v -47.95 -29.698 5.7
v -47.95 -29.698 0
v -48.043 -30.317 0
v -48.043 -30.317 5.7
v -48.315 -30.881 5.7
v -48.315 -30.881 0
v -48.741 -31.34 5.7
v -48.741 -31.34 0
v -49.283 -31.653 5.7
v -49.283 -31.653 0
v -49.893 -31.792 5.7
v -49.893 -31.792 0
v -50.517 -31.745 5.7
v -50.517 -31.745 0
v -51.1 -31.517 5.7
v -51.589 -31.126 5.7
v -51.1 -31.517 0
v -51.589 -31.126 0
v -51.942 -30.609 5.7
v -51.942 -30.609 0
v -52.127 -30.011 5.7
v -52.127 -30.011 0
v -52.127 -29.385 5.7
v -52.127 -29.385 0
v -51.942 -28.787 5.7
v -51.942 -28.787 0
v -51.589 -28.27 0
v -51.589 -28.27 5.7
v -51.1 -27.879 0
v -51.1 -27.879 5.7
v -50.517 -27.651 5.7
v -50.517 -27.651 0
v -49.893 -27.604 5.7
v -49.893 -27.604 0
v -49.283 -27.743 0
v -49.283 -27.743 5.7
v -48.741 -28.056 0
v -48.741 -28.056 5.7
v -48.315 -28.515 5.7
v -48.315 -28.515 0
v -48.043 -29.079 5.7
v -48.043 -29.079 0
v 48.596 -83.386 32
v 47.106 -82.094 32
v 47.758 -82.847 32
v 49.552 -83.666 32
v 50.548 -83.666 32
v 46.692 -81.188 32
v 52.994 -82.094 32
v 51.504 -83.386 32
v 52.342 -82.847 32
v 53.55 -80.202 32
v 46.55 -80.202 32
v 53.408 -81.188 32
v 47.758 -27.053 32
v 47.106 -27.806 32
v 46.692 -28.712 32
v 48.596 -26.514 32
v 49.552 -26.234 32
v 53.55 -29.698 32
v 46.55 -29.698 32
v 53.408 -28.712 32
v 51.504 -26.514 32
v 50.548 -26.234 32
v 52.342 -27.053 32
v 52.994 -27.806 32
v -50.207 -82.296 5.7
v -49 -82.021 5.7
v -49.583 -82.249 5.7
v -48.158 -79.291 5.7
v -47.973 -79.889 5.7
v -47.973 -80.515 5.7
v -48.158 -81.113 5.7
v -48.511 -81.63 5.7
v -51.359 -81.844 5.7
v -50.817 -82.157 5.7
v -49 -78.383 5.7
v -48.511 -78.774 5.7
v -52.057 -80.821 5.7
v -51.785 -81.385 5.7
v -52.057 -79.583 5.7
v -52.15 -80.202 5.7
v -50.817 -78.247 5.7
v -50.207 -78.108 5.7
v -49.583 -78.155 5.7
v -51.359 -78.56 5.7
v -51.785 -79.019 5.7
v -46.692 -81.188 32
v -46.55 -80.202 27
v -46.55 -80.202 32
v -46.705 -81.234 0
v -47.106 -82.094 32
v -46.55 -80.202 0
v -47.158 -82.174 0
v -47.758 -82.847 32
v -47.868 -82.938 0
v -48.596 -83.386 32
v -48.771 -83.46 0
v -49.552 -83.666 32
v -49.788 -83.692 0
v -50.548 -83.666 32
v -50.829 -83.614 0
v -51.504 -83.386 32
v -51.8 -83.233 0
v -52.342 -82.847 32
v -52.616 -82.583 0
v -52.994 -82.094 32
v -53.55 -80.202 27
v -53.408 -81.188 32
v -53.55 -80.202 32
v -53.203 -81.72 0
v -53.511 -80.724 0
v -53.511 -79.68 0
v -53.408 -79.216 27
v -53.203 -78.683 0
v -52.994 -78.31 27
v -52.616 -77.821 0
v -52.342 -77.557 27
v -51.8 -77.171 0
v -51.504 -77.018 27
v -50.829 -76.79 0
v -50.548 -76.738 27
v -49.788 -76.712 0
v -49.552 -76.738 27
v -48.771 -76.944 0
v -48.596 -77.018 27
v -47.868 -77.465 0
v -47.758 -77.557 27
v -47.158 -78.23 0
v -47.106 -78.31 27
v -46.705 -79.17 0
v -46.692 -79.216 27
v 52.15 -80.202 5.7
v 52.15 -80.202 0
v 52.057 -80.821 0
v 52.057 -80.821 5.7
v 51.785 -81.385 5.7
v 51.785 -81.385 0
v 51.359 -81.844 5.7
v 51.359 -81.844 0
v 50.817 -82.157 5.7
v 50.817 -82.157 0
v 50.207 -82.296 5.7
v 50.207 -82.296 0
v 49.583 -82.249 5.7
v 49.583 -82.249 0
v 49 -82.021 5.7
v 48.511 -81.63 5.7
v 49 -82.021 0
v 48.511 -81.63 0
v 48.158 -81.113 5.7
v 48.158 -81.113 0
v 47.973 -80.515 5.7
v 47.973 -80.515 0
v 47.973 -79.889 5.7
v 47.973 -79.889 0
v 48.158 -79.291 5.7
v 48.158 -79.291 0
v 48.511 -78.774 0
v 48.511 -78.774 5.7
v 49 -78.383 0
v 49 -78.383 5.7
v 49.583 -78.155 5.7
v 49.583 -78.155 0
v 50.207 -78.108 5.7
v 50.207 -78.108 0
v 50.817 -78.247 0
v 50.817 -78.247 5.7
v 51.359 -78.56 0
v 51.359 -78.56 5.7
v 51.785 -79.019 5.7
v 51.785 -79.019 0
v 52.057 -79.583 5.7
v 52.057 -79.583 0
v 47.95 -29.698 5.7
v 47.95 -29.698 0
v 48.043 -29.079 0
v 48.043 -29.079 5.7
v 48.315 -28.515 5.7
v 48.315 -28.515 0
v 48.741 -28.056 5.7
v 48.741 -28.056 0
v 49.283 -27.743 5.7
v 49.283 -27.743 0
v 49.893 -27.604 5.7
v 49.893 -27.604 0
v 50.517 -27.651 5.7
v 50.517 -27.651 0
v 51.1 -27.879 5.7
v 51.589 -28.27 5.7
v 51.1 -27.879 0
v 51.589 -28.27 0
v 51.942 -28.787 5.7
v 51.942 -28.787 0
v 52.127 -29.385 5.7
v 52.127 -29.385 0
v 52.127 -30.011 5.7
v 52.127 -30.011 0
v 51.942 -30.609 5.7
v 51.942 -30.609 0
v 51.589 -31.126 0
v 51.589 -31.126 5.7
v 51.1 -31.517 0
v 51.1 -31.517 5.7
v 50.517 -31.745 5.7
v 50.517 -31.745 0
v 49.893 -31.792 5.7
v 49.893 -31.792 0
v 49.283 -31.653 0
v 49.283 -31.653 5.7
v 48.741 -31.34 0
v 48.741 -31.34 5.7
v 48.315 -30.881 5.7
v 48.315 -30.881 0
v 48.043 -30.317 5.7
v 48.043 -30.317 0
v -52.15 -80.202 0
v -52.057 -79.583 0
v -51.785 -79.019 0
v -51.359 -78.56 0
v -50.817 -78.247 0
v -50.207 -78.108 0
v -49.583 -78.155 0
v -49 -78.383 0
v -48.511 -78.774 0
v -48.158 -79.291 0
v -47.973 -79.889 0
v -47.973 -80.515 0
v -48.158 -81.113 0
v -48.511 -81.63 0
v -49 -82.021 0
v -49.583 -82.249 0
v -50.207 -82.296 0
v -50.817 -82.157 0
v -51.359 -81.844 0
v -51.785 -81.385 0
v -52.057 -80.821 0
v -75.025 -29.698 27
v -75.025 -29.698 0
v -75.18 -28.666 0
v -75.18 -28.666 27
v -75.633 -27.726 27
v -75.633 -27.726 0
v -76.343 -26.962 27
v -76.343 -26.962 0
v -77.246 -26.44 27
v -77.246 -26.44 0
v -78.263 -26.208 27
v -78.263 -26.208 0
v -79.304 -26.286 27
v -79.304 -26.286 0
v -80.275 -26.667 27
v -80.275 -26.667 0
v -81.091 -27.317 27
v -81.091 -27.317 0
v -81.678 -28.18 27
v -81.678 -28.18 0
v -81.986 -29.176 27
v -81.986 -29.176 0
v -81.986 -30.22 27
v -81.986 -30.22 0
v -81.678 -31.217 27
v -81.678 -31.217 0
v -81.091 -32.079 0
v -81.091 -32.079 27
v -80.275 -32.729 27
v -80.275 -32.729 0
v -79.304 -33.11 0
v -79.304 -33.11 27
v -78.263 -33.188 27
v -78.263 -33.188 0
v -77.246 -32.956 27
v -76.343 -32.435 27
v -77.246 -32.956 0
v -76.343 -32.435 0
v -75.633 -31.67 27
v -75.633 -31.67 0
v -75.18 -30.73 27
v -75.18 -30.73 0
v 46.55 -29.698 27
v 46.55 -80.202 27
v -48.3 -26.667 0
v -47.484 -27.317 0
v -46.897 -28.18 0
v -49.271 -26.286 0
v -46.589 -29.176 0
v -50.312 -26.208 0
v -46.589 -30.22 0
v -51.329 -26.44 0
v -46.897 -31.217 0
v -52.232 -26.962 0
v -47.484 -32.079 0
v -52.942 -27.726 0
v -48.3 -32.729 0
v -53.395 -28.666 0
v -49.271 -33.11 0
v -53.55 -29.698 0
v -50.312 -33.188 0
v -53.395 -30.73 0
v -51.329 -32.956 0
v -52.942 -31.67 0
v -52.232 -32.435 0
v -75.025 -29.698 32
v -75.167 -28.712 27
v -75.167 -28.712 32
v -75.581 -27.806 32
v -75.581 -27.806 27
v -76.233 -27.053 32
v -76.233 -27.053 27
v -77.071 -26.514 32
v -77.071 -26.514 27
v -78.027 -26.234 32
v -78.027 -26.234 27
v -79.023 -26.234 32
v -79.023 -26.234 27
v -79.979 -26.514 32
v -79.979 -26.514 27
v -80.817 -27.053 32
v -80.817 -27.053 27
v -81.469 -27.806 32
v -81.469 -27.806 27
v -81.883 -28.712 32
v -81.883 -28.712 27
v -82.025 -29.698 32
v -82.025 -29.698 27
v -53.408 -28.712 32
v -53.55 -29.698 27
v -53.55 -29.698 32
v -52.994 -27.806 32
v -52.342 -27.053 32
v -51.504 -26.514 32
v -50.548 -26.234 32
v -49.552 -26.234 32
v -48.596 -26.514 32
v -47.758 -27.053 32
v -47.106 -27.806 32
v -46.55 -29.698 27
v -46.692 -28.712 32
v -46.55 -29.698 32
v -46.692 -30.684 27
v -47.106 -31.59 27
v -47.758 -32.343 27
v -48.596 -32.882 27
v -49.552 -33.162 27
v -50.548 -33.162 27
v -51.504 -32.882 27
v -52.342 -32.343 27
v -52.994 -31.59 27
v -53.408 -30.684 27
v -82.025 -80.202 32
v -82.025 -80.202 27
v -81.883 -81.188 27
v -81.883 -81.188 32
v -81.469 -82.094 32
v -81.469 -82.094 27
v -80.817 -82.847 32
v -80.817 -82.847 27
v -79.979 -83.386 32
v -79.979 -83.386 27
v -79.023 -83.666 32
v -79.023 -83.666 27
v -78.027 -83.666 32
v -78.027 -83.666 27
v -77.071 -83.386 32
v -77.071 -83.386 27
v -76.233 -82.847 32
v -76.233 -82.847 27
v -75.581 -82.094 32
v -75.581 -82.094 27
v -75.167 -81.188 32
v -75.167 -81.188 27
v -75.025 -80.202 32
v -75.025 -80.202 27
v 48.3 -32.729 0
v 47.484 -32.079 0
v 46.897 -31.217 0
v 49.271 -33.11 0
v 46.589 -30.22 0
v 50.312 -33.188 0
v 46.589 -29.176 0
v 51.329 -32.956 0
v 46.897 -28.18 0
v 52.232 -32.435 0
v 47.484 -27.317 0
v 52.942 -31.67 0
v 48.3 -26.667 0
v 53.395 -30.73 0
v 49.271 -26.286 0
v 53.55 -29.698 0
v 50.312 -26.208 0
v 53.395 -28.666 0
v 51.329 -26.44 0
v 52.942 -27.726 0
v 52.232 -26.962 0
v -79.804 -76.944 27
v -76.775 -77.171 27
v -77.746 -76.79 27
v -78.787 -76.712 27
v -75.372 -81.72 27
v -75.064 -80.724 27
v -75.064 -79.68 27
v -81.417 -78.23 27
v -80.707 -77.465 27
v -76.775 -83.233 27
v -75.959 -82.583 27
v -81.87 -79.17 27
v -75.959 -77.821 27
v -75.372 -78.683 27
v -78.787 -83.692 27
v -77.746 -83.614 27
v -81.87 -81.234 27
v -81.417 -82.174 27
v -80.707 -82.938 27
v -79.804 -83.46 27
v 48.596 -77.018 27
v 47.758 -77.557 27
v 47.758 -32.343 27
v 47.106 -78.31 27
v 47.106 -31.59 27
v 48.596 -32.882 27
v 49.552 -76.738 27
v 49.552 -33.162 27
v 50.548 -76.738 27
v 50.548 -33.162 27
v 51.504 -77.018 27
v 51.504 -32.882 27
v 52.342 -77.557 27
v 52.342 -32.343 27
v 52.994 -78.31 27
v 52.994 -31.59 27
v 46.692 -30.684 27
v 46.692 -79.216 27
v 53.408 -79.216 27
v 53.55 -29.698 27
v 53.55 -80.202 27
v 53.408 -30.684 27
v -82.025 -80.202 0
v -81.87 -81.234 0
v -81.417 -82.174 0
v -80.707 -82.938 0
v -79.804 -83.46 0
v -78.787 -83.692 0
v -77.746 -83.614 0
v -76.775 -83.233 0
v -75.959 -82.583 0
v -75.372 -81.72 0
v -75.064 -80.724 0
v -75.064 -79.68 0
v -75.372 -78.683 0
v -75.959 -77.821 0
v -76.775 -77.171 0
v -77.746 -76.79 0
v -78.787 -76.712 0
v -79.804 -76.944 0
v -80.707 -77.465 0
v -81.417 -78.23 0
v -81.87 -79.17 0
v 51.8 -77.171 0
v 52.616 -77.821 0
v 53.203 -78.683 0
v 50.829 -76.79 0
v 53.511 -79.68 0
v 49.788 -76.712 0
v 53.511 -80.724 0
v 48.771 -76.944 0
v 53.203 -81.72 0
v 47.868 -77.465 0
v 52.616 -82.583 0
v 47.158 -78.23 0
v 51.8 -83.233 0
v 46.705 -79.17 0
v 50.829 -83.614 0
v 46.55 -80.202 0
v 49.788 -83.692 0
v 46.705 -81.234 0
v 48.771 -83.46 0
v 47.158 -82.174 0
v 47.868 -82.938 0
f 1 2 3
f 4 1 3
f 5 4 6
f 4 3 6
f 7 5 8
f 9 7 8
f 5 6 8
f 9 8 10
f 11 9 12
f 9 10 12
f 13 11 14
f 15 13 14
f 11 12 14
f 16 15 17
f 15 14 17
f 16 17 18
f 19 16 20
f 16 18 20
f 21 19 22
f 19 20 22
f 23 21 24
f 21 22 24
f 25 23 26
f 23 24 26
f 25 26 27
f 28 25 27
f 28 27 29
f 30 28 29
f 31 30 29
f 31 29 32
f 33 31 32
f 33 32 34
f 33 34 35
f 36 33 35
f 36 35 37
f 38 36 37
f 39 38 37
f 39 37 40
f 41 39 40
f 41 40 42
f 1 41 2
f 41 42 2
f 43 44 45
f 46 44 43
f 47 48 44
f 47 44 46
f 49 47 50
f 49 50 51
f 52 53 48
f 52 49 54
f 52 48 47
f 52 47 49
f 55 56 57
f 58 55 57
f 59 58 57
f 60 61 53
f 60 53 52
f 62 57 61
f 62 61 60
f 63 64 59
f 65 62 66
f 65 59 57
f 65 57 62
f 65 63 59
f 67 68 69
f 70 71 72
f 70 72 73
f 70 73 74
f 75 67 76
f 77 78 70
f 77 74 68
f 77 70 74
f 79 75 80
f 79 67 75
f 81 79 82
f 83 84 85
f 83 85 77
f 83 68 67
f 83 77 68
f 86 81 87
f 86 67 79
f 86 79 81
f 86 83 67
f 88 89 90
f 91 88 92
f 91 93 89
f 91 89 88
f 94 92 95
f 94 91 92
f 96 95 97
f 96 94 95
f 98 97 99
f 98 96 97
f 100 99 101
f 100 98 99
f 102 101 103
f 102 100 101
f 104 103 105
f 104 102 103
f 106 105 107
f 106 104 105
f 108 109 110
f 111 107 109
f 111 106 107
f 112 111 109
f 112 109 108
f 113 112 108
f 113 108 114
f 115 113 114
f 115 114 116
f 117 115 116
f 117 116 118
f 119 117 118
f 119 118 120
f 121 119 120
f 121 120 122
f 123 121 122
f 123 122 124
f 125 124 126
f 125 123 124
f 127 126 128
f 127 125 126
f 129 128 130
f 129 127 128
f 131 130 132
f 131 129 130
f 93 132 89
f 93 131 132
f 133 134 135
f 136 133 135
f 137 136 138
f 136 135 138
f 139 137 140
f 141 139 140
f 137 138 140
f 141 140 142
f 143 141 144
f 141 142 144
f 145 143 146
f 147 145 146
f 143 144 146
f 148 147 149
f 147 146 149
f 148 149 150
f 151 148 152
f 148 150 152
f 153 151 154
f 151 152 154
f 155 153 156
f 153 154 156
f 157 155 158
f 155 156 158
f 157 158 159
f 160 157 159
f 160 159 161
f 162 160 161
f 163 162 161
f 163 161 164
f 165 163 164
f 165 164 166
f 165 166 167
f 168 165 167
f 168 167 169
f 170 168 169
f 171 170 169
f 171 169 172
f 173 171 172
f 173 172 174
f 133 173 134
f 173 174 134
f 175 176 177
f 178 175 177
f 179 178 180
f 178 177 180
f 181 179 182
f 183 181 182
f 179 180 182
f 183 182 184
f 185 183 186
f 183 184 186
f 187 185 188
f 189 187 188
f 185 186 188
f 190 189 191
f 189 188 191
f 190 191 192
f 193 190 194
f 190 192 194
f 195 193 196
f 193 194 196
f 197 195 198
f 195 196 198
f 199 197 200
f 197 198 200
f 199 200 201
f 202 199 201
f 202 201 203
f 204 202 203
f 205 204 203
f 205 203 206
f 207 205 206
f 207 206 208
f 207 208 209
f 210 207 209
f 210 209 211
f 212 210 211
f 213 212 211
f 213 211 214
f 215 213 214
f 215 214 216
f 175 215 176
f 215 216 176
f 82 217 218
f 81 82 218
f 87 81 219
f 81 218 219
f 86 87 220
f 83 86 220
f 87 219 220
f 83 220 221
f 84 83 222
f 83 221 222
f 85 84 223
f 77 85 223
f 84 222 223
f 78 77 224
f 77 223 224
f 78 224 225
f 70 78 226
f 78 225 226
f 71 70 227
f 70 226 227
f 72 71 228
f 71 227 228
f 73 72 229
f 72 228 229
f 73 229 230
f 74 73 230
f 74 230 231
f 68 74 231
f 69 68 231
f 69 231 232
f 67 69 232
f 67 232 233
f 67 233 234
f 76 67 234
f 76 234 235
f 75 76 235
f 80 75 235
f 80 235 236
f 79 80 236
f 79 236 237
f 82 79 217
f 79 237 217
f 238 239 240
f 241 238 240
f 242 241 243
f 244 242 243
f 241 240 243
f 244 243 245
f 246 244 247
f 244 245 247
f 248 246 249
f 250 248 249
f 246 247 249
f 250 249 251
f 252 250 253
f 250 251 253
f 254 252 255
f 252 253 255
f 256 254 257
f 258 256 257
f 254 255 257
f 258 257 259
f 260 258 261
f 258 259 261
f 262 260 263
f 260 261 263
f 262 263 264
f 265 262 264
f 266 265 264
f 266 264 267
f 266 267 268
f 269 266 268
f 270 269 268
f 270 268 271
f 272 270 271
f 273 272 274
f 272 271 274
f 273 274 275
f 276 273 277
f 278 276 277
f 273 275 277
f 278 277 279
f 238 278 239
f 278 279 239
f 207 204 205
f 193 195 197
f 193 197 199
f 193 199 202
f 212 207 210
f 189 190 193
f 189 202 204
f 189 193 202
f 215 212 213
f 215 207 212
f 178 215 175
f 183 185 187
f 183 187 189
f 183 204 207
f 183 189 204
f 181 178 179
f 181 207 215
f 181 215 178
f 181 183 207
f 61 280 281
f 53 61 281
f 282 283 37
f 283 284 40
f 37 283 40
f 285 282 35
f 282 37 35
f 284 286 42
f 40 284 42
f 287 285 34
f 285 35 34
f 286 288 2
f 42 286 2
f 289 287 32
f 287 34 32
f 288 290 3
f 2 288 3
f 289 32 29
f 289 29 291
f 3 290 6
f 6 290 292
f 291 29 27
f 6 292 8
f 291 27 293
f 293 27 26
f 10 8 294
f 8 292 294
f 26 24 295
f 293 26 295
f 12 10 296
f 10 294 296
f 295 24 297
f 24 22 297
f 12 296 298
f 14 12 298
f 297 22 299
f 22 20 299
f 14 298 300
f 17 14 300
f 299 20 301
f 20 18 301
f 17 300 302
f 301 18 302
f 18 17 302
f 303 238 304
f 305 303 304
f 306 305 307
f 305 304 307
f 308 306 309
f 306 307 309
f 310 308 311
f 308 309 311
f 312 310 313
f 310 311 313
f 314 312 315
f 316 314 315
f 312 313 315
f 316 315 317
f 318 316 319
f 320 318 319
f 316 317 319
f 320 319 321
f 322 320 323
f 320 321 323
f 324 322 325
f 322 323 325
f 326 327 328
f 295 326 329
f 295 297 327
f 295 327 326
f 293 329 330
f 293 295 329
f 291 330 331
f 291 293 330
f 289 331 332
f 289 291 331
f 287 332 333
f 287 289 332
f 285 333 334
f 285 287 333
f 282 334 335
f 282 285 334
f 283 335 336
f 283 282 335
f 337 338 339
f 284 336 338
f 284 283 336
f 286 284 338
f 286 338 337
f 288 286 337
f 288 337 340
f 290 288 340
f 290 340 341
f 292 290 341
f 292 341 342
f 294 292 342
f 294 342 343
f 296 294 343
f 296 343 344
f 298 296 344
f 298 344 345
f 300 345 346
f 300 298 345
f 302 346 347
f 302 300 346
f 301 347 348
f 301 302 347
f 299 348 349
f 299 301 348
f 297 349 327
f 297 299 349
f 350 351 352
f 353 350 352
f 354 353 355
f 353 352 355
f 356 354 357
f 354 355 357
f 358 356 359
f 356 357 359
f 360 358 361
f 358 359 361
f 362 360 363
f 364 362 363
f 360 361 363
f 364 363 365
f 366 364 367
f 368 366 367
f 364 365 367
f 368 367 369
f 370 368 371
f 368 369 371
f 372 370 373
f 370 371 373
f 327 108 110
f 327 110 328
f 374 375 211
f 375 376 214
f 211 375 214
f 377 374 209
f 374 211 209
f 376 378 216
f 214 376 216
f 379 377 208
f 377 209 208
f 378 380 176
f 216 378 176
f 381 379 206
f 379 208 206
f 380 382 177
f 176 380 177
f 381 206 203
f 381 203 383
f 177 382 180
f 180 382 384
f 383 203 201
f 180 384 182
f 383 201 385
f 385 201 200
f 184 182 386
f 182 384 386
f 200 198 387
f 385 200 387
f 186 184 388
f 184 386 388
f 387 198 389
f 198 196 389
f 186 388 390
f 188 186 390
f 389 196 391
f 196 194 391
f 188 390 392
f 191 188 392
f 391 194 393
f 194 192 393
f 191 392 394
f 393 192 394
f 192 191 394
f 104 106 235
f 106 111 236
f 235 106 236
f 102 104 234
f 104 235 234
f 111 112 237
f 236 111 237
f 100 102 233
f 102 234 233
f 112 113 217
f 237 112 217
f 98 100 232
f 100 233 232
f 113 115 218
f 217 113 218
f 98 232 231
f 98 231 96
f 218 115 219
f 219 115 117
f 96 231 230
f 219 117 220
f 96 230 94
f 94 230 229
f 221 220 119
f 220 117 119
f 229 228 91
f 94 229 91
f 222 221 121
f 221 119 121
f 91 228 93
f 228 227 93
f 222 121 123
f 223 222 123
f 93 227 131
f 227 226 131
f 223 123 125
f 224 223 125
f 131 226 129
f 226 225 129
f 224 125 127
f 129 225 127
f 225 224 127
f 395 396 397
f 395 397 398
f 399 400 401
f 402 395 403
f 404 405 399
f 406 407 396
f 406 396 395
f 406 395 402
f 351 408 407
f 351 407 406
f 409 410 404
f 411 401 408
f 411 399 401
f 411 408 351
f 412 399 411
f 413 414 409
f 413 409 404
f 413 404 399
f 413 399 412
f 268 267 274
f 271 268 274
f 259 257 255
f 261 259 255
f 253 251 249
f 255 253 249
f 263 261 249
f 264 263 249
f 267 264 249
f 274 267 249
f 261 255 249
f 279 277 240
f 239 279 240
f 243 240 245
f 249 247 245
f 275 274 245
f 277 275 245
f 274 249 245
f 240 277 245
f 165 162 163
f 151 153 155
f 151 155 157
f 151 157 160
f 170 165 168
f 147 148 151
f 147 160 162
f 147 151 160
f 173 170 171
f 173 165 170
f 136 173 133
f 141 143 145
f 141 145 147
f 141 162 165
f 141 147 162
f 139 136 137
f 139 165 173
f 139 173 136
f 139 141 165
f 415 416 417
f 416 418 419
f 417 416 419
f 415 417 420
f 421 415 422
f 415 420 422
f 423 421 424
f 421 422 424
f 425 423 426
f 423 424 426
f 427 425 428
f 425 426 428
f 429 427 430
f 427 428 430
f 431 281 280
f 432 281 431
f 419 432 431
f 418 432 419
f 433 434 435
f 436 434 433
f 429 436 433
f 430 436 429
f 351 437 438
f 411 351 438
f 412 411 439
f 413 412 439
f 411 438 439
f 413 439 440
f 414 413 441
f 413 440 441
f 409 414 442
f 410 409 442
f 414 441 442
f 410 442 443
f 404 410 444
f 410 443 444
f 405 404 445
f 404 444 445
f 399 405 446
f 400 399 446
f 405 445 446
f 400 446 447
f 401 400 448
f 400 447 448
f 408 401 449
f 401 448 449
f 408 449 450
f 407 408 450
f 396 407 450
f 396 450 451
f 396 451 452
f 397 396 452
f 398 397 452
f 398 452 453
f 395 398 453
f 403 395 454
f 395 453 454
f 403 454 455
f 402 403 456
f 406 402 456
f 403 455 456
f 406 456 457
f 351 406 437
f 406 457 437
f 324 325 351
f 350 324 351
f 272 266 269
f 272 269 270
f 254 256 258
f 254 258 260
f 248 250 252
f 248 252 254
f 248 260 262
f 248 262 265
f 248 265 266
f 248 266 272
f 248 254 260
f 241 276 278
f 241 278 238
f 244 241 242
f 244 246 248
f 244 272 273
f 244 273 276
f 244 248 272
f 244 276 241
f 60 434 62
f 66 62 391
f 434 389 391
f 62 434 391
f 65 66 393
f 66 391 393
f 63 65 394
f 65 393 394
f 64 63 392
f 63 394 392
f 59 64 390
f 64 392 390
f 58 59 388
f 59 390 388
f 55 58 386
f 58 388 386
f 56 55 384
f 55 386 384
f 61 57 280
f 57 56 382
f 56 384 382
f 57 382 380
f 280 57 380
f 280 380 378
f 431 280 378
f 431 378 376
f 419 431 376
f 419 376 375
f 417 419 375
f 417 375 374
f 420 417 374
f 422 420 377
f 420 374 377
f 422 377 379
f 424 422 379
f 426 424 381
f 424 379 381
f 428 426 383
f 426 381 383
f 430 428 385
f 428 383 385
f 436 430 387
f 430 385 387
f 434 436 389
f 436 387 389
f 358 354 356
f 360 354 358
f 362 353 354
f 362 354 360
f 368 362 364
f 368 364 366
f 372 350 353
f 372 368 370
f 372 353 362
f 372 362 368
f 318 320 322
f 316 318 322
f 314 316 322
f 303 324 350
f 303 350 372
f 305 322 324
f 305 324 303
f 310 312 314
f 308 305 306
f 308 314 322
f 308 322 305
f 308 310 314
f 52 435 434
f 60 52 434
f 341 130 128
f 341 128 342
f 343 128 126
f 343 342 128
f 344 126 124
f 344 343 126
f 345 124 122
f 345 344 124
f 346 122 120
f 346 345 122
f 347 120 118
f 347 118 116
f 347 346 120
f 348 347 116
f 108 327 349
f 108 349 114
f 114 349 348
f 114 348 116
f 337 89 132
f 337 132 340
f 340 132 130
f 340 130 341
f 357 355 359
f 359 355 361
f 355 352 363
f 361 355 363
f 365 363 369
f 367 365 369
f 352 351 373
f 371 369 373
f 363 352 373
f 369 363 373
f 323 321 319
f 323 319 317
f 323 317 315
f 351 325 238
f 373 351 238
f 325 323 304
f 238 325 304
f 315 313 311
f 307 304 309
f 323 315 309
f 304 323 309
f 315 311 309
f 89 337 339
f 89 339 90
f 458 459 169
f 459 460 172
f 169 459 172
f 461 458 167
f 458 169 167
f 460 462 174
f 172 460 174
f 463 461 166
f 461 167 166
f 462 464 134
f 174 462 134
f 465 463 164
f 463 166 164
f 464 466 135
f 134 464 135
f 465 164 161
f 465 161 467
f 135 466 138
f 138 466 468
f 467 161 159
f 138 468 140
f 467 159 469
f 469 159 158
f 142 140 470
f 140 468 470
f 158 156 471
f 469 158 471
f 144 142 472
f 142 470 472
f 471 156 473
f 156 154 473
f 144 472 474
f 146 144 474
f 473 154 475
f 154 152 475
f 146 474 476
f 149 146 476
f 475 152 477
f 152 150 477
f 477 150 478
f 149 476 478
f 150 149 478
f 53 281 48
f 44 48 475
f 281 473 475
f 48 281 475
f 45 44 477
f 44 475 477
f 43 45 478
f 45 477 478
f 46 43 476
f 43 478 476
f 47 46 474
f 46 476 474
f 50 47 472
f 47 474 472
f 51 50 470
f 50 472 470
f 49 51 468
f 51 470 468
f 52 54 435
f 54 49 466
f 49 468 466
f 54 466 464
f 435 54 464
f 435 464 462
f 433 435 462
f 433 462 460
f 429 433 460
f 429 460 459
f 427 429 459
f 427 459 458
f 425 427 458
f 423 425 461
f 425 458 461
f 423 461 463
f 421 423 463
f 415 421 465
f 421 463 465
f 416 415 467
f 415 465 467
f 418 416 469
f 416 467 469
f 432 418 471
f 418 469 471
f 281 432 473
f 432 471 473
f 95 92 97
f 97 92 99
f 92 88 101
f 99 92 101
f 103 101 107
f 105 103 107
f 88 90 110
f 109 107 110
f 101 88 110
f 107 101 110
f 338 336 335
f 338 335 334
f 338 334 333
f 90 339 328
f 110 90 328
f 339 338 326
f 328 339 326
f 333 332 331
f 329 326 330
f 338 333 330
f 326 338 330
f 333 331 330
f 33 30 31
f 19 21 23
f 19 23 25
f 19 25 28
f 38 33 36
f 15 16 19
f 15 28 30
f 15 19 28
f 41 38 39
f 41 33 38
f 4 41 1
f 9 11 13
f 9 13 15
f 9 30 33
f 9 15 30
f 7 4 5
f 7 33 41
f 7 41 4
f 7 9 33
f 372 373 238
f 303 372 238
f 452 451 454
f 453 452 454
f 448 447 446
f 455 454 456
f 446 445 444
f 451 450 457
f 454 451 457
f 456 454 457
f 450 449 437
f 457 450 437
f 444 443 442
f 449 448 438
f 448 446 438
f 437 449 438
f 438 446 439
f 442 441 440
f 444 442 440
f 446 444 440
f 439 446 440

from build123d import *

# Parameters (mm, degrees)
SKIZZE1_R                         = 3.5
AUFSATZ_LINEAR_AUSTRAGEN1_DEPTH   = 27
AUFSATZ_LINEAR_AUSTRAGEN1_2_DEPTH = 27
AUFSATZ_LINEAR_AUSTRAGEN1_3_DEPTH = 27
AUFSATZ_LINEAR_AUSTRAGEN1_4_DEPTH = 27
AUFSATZ_LINEAR_AUSTRAGEN1_5_DEPTH = 27
AUFSATZ_LINEAR_AUSTRAGEN1_6_DEPTH = 27
SKIZZE2_R                         = 2.1
SCHNITT_LINEAR_AUSTRAGEN1_DEPTH   = 5.7
AUFSATZ_LINEAR_AUSTRAGEN2_DEPTH   = 5


with BuildPart() as part:
    # Skizze1 → Aufsatz-Linear austragen1 (new body)
    with BuildSketch(Plane.XY):
        with Locations((-50.05, -80.201897344)):
            Circle(SKIZZE1_R)
    extrude(amount=AUFSATZ_LINEAR_AUSTRAGEN1_DEPTH)


with BuildPart() as body_2:
    # Skizze1 → Aufsatz-Linear austragen1 2 (new body)
    with BuildSketch(Plane.XY):
        with Locations(Location((50.05, -80.201897344, 0), (0, 0, 180))):
            Circle(SKIZZE1_R)
    extrude(amount=AUFSATZ_LINEAR_AUSTRAGEN1_2_DEPTH)


with BuildPart() as body_3:
    # Skizze1 → Aufsatz-Linear austragen1 3 (new body)
    with BuildSketch(Plane.XY):
        with Locations((50.05, -29.698102656)):
            Circle(SKIZZE1_R)
    extrude(amount=AUFSATZ_LINEAR_AUSTRAGEN1_3_DEPTH)


with BuildPart() as body_4:
    # Skizze1 → Aufsatz-Linear austragen1 4 (new body)
    with BuildSketch(Plane.XY):
        with Locations(Location((-50.05, -29.698102656, 0), (0, 0, 180))):
            Circle(SKIZZE1_R)
    extrude(amount=AUFSATZ_LINEAR_AUSTRAGEN1_4_DEPTH)


with BuildPart() as body_5:
    # Skizze1 → Aufsatz-Linear austragen1 5 (new body)
    with BuildSketch(Plane.XY):
        with Locations(Location((-78.525, -80.201897344, 0), (0, 0, 180))):
            Circle(SKIZZE1_R)
    extrude(amount=AUFSATZ_LINEAR_AUSTRAGEN1_5_DEPTH)


with BuildPart() as body_6:
    # Skizze1 → Aufsatz-Linear austragen1 6 (new body)
    with BuildSketch(Plane.XY):
        with Locations((-78.525, -29.698102656)):
            Circle(SKIZZE1_R)
    extrude(amount=AUFSATZ_LINEAR_AUSTRAGEN1_6_DEPTH)


with BuildPart() as schnitt_linear_austragen1_tool:
    # Skizze2 → Schnitt-Linear austragen1 (new body)
    with BuildSketch(Plane(origin=(0, 0, 0), x_dir=(-1, 0, 0), z_dir=(0, 0, -1))):
        with Locations((50.05, -80.201897344)):
            Circle(SKIZZE2_R)
        with Locations(Location((50.05, -29.698102656, 0), (0, 0, 180))):
            Circle(SKIZZE2_R)
        with Locations((-50.05, -29.698102656)):
            Circle(SKIZZE2_R)
        with Locations(Location((-50.05, -80.201897344, 0), (0, 0, 180))):
            Circle(SKIZZE2_R)
    extrude(amount=-SCHNITT_LINEAR_AUSTRAGEN1_DEPTH)


with BuildPart() as part_1:
    add(part.part)

    # Schnitt-Linear austragen1: cut by schnitt_linear_austragen1_tool
    add(schnitt_linear_austragen1_tool.part, mode=Mode.SUBTRACT)



with BuildPart() as body_2_1:
    add(body_2.part)

    # Schnitt-Linear austragen1: cut by schnitt_linear_austragen1_tool
    add(schnitt_linear_austragen1_tool.part, mode=Mode.SUBTRACT)


with BuildPart() as body_3_1:
    add(body_3.part)

    # Schnitt-Linear austragen1: cut by schnitt_linear_austragen1_tool
    add(schnitt_linear_austragen1_tool.part, mode=Mode.SUBTRACT)


with BuildPart() as body_4_1:
    add(body_4.part)

    # Schnitt-Linear austragen1: cut by schnitt_linear_austragen1_tool
    add(schnitt_linear_austragen1_tool.part, mode=Mode.SUBTRACT)


with BuildPart() as part_2:
    add(part_1.part)

    add(body_4_1.part)  # Aufsatz-Linear austragen2 merges body 4

    add(body_2_1.part)  # Aufsatz-Linear austragen2 merges body 2

    add(body_3_1.part)  # Aufsatz-Linear austragen2 merges body 3
    # Skizze4 → Aufsatz-Linear austragen2 (add)
    with BuildSketch(Plane.XY.offset(27)):
        with BuildLine():
            Line((-53.55, -80.201897344), (-53.55, -29.698102656))
            ThreePointArc((-53.55, -29.698102656), (-50.05, -26.198102656), (-46.55, -29.698102656))
            Line((-46.55, -29.698102656), (-46.55, -80.201897344))
            ThreePointArc((-46.55, -80.201897344), (-50.05, -83.701897344), (-53.55, -80.201897344))
        make_face()
        with BuildLine():
            Line((46.55, -29.698102656), (46.55, -80.201897344))
            ThreePointArc((46.55, -80.201897344), (50.05, -83.701897344), (53.55, -80.201897344))
            Line((53.55, -80.201897344), (53.55, -29.698102656))
            ThreePointArc((53.55, -29.698102656), (50.05, -26.198102656), (46.55, -29.698102656))
        make_face()
        with BuildLine():
            Line((-82.025, -29.698102656), (-82.025, -80.201897344))
            ThreePointArc((-82.025, -80.201897344), (-78.525, -83.701897344), (-75.025, -80.201897344))
            Line((-75.025, -80.201897344), (-75.025, -29.698102656))
            ThreePointArc((-75.025, -29.698102656), (-78.525, -26.198102656), (-82.025, -29.698102656))
        make_face()
    extrude(amount=AUFSATZ_LINEAR_AUSTRAGEN2_DEPTH)


solid = Compound([body_5.part, body_6.part, part_2.part])
